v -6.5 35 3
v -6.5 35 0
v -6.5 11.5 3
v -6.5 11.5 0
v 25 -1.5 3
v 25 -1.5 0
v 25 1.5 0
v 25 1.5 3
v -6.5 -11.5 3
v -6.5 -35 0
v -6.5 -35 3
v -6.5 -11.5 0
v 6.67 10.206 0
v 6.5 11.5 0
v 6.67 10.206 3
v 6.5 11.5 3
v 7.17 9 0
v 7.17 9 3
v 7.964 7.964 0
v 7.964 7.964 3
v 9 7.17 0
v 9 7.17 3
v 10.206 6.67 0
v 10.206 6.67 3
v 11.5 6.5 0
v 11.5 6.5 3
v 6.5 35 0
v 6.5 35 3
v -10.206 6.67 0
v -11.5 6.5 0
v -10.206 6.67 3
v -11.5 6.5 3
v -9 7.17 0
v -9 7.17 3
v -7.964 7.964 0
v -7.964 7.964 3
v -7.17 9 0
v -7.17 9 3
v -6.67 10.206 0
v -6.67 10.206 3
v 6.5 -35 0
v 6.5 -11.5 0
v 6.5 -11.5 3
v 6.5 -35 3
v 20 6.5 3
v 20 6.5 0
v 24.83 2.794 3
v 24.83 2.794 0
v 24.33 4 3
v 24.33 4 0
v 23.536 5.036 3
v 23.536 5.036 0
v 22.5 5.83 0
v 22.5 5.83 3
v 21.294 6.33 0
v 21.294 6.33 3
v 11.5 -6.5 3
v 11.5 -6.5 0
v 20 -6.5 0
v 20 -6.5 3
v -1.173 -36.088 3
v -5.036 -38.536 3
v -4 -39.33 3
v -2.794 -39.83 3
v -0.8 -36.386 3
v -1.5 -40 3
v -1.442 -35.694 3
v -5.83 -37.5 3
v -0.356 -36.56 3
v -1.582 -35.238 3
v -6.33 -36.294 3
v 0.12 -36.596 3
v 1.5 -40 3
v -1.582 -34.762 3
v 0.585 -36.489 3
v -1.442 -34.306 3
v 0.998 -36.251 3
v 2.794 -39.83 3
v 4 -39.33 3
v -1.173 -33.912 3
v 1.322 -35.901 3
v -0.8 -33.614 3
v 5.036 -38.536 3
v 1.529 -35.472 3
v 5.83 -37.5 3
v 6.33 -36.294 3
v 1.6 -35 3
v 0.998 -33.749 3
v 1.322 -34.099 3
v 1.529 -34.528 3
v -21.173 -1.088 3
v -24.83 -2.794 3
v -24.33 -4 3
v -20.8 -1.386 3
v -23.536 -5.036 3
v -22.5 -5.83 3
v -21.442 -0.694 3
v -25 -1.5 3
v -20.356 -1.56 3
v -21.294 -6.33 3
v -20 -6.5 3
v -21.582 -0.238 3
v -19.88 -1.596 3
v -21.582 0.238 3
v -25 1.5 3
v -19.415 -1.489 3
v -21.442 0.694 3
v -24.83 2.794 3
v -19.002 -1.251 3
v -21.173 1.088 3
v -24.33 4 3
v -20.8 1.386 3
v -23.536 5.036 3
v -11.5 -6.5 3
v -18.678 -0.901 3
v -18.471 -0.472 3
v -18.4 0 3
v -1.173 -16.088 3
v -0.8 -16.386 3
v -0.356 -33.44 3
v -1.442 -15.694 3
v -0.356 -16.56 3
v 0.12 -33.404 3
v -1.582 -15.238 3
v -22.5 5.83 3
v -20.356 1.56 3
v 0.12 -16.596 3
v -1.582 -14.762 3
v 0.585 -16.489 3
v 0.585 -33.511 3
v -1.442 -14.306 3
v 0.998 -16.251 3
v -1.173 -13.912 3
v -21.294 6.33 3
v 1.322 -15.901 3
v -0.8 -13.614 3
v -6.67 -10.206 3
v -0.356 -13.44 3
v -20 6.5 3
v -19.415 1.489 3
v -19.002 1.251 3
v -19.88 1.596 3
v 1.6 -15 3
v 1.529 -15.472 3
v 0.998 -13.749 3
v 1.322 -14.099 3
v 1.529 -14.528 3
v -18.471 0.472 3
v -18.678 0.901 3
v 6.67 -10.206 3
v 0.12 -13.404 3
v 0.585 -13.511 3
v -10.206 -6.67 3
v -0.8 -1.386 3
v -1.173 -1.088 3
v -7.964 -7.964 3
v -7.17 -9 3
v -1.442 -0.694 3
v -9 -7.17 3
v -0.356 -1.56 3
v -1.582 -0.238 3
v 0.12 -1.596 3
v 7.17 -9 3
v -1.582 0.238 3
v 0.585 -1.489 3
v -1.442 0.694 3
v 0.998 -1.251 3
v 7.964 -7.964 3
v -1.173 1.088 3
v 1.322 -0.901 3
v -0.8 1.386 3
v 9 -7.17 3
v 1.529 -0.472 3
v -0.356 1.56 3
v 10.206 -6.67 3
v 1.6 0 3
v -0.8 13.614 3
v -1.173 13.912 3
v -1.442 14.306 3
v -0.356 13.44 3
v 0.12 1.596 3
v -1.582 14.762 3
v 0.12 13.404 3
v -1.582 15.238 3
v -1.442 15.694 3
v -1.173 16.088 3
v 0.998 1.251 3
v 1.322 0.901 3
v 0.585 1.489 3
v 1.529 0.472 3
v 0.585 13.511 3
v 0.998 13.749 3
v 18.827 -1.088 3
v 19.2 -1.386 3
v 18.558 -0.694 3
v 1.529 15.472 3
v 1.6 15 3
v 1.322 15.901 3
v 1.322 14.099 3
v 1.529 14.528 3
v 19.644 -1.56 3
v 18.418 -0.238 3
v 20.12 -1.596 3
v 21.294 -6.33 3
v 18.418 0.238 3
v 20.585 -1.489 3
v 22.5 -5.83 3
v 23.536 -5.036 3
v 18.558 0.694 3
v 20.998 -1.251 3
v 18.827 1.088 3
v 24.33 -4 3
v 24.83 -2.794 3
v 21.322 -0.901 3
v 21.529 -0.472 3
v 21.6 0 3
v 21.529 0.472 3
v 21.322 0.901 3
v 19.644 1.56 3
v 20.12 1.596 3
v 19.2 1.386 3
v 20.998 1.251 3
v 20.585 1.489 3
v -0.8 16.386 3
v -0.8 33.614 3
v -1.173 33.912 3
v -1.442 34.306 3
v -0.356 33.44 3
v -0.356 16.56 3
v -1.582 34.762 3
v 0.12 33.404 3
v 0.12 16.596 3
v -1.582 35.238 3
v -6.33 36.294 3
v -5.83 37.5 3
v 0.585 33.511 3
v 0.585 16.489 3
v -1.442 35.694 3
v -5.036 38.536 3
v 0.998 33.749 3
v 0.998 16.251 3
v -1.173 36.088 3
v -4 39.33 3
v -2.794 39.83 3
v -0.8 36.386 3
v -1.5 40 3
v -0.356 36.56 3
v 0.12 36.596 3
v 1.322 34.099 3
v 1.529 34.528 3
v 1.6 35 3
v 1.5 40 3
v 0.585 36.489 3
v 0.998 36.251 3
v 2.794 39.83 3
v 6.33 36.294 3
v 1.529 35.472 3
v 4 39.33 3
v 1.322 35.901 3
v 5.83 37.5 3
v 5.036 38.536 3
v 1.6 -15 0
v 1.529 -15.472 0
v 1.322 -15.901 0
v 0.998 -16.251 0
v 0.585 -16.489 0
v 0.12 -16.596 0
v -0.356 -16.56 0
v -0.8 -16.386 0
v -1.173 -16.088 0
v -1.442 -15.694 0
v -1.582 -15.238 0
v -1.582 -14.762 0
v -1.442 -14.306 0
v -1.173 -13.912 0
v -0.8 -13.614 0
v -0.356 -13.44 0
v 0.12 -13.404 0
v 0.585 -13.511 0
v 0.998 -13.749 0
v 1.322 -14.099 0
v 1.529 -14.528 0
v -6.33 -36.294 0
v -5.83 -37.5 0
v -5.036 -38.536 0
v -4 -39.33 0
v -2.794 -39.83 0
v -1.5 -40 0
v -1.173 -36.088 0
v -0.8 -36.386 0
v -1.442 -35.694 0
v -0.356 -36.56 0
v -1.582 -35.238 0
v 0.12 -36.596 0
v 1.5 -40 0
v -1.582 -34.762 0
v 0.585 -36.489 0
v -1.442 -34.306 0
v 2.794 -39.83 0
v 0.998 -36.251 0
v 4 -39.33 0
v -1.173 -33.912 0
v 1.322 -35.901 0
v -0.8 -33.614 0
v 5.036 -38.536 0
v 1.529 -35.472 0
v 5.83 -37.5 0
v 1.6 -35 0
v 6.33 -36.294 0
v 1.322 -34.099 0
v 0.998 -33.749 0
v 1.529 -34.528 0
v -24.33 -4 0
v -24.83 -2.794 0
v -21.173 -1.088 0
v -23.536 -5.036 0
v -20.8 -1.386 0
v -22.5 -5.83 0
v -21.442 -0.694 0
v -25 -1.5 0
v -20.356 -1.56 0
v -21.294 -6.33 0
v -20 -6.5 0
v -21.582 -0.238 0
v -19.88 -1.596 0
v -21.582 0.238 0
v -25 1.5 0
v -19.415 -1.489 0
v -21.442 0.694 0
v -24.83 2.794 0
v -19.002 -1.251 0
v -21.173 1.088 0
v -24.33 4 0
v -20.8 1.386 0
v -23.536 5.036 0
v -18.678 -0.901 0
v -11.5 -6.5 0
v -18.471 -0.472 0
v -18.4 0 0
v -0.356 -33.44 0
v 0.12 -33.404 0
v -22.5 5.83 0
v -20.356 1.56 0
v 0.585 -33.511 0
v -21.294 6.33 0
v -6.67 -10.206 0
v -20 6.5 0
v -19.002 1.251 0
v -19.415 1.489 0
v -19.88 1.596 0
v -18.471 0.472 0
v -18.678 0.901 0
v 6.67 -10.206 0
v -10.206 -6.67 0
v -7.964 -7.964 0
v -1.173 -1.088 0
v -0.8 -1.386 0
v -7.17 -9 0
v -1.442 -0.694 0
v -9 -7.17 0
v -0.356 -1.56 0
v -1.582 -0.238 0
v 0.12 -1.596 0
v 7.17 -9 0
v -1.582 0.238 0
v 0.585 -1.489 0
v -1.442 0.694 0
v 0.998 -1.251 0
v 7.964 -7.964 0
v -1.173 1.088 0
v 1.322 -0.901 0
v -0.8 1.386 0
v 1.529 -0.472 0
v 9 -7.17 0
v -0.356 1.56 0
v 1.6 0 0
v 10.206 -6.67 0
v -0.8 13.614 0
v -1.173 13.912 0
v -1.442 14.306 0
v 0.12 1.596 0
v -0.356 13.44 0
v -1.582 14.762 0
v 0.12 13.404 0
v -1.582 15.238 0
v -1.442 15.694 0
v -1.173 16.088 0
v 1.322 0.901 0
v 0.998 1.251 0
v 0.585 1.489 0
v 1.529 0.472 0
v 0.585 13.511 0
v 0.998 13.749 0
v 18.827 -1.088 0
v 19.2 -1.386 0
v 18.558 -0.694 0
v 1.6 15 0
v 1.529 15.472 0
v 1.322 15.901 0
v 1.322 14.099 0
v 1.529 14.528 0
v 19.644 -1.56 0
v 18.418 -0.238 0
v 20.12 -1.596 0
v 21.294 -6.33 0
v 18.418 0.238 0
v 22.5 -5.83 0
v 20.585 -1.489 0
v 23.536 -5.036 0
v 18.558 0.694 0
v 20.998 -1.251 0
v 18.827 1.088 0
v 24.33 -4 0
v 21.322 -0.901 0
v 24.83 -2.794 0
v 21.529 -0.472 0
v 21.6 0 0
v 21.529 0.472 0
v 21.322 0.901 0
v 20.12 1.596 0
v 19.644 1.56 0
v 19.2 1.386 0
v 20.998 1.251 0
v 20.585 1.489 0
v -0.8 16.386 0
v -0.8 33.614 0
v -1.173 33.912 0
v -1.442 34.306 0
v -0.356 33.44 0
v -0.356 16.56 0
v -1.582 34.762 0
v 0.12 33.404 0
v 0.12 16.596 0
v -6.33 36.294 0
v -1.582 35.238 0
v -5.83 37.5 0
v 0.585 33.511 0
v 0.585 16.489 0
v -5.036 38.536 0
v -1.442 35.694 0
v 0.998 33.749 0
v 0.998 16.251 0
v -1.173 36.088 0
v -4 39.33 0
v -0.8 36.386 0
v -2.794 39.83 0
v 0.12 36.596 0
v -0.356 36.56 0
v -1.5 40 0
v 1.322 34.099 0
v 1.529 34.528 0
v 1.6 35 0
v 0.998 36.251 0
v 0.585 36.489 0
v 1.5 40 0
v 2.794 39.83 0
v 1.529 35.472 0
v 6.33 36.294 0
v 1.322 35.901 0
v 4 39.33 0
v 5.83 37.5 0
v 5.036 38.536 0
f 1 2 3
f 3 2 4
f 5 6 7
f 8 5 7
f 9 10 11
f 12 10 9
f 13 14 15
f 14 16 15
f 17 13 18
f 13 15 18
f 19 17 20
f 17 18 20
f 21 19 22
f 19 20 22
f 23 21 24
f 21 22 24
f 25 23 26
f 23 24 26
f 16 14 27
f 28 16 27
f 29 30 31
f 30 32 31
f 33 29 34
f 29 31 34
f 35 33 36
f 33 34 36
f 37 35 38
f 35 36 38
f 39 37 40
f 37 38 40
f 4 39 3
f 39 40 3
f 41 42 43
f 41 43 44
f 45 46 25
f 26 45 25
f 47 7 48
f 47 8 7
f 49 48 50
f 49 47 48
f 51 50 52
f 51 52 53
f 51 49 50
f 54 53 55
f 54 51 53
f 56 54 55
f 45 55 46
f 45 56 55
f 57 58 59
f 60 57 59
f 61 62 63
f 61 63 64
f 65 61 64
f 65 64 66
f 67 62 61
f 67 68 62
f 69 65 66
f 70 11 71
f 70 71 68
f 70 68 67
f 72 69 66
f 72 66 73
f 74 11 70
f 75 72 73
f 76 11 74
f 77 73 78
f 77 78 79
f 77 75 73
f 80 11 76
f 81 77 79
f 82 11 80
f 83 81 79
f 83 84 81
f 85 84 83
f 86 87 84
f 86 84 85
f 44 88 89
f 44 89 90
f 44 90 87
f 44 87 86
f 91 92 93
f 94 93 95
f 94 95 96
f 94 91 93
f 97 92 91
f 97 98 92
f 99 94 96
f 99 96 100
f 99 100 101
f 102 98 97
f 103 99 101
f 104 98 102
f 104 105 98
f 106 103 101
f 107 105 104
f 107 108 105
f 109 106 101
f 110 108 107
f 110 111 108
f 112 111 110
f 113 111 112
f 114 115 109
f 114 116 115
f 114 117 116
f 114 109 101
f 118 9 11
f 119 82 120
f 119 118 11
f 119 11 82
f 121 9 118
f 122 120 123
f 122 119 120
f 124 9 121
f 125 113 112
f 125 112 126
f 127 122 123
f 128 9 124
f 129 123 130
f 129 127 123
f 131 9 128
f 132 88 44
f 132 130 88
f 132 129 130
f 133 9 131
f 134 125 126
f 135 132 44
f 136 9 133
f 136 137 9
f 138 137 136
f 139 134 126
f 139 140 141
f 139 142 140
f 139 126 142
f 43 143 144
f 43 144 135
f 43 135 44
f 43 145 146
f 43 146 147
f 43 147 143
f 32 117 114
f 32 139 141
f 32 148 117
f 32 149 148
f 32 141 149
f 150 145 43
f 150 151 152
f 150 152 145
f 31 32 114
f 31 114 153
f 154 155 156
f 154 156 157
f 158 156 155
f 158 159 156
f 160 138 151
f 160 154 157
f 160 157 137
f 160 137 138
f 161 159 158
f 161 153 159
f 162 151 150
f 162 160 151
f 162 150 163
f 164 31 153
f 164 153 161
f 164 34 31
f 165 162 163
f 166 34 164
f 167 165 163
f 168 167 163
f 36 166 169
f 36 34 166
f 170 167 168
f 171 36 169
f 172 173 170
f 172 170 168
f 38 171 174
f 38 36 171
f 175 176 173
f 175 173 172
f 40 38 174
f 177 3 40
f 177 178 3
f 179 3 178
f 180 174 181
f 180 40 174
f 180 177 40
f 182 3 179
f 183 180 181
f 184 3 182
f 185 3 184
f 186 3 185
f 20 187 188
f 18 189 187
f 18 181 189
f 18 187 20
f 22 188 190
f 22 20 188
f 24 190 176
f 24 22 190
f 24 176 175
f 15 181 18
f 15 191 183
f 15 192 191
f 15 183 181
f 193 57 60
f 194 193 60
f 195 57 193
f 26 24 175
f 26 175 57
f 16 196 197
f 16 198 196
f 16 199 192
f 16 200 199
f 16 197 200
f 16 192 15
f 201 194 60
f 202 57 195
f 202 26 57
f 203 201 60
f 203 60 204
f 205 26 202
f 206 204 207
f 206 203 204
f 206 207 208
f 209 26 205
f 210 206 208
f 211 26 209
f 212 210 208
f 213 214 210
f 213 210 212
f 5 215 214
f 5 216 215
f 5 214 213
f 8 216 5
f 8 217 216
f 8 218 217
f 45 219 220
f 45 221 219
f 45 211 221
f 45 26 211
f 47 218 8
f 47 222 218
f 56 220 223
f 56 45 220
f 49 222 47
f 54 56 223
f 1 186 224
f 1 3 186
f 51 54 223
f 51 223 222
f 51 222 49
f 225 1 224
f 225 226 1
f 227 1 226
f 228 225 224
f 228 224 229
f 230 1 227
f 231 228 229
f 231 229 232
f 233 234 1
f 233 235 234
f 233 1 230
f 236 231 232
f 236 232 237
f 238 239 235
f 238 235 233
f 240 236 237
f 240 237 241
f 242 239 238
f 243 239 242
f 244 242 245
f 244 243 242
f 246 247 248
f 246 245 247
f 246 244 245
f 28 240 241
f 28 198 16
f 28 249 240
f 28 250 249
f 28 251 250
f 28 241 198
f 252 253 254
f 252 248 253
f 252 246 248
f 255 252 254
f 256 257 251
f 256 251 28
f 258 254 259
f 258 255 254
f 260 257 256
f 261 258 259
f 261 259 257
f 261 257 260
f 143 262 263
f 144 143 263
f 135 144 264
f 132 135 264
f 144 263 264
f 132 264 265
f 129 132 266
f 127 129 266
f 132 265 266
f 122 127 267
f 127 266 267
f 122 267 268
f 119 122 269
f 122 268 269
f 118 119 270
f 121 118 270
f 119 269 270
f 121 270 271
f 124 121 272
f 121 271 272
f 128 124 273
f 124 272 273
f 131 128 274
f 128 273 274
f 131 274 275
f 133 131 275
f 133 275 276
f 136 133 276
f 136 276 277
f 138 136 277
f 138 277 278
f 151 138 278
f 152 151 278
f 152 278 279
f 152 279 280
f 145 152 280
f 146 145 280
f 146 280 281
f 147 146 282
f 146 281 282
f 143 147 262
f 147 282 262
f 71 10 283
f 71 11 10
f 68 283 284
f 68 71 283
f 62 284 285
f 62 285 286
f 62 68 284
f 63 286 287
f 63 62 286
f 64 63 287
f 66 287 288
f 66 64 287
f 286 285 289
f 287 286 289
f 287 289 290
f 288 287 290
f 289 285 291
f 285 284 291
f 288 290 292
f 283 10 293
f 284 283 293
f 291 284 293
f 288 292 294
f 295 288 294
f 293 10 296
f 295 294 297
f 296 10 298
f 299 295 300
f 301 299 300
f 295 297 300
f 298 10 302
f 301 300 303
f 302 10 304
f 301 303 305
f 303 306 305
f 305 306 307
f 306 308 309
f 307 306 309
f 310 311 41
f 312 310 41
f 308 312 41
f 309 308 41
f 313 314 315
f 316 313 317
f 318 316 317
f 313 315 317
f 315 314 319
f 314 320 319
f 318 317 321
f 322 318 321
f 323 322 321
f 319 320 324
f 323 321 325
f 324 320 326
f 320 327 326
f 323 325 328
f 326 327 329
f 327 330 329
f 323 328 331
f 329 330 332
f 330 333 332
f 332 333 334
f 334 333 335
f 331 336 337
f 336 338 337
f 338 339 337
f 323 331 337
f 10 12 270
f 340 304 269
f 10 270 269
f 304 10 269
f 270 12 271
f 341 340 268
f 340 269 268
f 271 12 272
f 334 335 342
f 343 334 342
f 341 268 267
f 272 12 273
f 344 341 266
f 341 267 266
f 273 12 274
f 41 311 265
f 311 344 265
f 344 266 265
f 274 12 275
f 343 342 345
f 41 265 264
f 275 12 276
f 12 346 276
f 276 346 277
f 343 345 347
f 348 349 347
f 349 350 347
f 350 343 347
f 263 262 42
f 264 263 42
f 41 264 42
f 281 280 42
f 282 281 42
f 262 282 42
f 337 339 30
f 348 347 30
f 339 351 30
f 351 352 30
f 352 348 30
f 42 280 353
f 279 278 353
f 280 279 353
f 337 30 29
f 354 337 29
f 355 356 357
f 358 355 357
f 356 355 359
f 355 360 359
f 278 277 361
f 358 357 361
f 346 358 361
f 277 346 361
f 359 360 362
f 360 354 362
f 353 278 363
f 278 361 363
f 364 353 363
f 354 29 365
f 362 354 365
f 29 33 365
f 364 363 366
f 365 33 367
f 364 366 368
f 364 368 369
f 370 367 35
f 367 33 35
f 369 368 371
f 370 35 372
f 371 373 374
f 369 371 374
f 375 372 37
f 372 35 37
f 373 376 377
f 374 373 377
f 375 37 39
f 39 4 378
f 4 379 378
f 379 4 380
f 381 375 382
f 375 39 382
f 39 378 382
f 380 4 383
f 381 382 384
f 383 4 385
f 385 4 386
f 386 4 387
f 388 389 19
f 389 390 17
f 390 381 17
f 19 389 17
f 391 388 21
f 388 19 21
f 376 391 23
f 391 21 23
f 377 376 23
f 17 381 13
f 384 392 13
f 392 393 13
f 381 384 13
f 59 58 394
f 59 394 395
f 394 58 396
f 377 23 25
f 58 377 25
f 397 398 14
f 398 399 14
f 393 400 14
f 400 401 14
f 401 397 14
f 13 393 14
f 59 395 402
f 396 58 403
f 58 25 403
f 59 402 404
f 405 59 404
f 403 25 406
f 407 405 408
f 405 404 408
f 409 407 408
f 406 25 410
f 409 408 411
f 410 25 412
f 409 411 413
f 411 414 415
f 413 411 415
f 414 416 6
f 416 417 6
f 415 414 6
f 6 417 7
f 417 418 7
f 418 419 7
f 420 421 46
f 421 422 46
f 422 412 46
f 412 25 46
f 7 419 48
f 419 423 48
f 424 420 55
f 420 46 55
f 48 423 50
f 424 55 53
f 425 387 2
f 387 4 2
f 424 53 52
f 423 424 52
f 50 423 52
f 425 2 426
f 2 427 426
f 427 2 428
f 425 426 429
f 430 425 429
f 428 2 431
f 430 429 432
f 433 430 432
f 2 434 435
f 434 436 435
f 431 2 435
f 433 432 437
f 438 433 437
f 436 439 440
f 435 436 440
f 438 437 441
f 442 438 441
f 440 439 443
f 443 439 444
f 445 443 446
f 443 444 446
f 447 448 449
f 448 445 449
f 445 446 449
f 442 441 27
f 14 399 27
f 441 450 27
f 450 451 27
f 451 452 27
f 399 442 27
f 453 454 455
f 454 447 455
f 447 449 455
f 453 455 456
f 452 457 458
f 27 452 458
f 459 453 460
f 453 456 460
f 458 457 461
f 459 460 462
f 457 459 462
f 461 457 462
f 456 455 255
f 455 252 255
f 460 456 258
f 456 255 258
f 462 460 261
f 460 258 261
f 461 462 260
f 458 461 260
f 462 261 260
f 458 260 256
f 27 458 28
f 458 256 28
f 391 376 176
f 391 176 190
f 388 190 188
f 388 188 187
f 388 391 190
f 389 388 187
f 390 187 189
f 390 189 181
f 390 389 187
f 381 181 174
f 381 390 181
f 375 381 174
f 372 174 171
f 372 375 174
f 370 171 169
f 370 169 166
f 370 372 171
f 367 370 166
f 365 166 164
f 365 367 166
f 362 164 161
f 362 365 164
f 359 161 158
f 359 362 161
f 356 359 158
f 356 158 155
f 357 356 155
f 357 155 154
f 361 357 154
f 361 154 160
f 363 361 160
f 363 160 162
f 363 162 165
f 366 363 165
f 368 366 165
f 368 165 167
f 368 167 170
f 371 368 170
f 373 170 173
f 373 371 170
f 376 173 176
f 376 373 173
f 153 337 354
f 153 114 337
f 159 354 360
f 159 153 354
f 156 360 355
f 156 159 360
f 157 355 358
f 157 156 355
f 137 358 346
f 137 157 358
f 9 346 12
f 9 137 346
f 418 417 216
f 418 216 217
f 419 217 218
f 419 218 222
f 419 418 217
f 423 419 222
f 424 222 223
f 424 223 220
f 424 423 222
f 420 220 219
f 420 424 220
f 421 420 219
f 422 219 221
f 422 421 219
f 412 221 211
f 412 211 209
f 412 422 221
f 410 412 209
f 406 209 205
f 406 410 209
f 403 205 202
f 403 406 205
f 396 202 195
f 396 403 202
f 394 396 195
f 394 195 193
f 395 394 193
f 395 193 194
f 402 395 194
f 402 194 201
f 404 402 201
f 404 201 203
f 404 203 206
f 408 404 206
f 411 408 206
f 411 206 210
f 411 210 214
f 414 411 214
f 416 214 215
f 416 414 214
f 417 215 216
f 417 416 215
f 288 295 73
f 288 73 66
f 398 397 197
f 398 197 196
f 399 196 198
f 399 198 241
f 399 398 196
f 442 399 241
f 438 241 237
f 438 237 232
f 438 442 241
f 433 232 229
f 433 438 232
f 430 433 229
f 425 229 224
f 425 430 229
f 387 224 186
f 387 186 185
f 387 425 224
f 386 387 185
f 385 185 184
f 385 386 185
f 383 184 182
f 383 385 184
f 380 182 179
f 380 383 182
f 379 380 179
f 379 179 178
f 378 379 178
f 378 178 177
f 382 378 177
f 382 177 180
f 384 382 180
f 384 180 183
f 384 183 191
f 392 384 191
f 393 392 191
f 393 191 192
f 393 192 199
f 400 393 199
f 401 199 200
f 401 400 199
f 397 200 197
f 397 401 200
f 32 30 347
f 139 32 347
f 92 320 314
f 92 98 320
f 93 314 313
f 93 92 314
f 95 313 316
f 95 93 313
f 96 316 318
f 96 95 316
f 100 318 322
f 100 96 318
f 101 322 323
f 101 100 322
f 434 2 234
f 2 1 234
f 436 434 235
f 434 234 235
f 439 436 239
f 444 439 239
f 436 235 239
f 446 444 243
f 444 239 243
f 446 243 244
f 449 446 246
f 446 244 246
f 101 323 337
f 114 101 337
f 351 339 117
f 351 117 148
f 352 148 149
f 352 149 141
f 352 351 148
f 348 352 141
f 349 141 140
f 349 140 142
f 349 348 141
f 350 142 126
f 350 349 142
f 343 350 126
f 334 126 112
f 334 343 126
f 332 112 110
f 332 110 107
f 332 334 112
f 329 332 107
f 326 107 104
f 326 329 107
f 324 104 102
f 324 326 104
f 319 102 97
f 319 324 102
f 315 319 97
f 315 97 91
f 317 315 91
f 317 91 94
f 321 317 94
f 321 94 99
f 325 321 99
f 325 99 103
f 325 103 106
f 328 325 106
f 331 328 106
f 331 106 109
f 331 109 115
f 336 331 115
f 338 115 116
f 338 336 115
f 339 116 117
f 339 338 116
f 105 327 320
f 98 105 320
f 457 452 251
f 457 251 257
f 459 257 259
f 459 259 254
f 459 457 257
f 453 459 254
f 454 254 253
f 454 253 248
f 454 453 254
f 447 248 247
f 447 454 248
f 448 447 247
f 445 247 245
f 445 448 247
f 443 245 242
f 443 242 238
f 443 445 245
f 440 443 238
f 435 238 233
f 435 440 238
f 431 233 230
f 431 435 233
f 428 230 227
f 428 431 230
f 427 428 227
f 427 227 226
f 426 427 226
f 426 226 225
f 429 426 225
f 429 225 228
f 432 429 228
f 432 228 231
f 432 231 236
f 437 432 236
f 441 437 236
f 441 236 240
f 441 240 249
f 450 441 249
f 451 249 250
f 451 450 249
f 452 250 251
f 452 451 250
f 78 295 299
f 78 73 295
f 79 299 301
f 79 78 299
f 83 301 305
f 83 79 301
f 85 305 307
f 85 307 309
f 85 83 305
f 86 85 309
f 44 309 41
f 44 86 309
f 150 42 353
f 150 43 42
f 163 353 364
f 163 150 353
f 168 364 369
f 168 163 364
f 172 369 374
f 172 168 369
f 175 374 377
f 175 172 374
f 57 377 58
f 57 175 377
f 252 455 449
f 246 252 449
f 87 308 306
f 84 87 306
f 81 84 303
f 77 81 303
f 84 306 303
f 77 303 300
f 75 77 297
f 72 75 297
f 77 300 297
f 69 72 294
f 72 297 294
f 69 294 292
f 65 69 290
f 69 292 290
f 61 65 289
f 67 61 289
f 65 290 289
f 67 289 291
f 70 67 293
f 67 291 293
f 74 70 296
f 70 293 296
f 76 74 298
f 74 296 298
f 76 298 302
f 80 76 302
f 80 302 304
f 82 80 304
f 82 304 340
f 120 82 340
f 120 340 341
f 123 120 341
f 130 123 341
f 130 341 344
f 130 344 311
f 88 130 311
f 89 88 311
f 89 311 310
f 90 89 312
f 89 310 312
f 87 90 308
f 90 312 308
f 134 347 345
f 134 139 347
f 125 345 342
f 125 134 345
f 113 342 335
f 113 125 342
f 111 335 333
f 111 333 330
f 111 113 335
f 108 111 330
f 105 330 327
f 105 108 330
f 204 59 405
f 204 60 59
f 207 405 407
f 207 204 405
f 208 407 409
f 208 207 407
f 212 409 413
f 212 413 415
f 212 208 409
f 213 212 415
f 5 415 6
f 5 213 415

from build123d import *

# Parameters (mm, degrees)
SKETCH_1_R      = 1.6
EXTRUDE_1_DEPTH = 3
FILLET_1_R      = 5


with BuildPart() as part:
    # 草图1 → 凸台-拉伸1 (new body)
    with BuildSketch(Plane.XY):
        Polygon((-6.5, 6.5), (-25, 6.5), (-25, -6.5), (25, -6.5), (25, 6.5), (6.5, 6.5), (6.5, 40), (-6.5, 40), align=None)
        with Locations((0, 35)):
            Circle(SKETCH_1_R, mode=Mode.SUBTRACT)
        with Locations((0, 15)):
            Circle(SKETCH_1_R, mode=Mode.SUBTRACT)
        Circle(SKETCH_1_R, mode=Mode.SUBTRACT)
        with Locations((20, 0)):
            Circle(SKETCH_1_R, mode=Mode.SUBTRACT)
        with Locations((-20, 0)):
            Circle(SKETCH_1_R, mode=Mode.SUBTRACT)
    extrude(amount=EXTRUDE_1_DEPTH)

    # 圆角1
    fillet_1_edges = [part.edges().sort_by_distance(p)[0] for p in [
        (-6.5, 40, 1.5),
        (6.5, 40, 1.5),
        (6.5, 6.5, 1.5),
        (25, 6.5, 1.5),
        (25, -6.5, 1.5),
        (-25, -6.5, 1.5),
        (-25, 6.5, 1.5),
        (-6.5, 6.5, 1.5),
    ]]
    fillet(fillet_1_edges, radius=FILLET_1_R)

    # 镜向1: part across plane


with BuildPart() as part_1:
    add(part.part)
    add(part.part.mirror(Plane.ZX))


solid = part_1.part
